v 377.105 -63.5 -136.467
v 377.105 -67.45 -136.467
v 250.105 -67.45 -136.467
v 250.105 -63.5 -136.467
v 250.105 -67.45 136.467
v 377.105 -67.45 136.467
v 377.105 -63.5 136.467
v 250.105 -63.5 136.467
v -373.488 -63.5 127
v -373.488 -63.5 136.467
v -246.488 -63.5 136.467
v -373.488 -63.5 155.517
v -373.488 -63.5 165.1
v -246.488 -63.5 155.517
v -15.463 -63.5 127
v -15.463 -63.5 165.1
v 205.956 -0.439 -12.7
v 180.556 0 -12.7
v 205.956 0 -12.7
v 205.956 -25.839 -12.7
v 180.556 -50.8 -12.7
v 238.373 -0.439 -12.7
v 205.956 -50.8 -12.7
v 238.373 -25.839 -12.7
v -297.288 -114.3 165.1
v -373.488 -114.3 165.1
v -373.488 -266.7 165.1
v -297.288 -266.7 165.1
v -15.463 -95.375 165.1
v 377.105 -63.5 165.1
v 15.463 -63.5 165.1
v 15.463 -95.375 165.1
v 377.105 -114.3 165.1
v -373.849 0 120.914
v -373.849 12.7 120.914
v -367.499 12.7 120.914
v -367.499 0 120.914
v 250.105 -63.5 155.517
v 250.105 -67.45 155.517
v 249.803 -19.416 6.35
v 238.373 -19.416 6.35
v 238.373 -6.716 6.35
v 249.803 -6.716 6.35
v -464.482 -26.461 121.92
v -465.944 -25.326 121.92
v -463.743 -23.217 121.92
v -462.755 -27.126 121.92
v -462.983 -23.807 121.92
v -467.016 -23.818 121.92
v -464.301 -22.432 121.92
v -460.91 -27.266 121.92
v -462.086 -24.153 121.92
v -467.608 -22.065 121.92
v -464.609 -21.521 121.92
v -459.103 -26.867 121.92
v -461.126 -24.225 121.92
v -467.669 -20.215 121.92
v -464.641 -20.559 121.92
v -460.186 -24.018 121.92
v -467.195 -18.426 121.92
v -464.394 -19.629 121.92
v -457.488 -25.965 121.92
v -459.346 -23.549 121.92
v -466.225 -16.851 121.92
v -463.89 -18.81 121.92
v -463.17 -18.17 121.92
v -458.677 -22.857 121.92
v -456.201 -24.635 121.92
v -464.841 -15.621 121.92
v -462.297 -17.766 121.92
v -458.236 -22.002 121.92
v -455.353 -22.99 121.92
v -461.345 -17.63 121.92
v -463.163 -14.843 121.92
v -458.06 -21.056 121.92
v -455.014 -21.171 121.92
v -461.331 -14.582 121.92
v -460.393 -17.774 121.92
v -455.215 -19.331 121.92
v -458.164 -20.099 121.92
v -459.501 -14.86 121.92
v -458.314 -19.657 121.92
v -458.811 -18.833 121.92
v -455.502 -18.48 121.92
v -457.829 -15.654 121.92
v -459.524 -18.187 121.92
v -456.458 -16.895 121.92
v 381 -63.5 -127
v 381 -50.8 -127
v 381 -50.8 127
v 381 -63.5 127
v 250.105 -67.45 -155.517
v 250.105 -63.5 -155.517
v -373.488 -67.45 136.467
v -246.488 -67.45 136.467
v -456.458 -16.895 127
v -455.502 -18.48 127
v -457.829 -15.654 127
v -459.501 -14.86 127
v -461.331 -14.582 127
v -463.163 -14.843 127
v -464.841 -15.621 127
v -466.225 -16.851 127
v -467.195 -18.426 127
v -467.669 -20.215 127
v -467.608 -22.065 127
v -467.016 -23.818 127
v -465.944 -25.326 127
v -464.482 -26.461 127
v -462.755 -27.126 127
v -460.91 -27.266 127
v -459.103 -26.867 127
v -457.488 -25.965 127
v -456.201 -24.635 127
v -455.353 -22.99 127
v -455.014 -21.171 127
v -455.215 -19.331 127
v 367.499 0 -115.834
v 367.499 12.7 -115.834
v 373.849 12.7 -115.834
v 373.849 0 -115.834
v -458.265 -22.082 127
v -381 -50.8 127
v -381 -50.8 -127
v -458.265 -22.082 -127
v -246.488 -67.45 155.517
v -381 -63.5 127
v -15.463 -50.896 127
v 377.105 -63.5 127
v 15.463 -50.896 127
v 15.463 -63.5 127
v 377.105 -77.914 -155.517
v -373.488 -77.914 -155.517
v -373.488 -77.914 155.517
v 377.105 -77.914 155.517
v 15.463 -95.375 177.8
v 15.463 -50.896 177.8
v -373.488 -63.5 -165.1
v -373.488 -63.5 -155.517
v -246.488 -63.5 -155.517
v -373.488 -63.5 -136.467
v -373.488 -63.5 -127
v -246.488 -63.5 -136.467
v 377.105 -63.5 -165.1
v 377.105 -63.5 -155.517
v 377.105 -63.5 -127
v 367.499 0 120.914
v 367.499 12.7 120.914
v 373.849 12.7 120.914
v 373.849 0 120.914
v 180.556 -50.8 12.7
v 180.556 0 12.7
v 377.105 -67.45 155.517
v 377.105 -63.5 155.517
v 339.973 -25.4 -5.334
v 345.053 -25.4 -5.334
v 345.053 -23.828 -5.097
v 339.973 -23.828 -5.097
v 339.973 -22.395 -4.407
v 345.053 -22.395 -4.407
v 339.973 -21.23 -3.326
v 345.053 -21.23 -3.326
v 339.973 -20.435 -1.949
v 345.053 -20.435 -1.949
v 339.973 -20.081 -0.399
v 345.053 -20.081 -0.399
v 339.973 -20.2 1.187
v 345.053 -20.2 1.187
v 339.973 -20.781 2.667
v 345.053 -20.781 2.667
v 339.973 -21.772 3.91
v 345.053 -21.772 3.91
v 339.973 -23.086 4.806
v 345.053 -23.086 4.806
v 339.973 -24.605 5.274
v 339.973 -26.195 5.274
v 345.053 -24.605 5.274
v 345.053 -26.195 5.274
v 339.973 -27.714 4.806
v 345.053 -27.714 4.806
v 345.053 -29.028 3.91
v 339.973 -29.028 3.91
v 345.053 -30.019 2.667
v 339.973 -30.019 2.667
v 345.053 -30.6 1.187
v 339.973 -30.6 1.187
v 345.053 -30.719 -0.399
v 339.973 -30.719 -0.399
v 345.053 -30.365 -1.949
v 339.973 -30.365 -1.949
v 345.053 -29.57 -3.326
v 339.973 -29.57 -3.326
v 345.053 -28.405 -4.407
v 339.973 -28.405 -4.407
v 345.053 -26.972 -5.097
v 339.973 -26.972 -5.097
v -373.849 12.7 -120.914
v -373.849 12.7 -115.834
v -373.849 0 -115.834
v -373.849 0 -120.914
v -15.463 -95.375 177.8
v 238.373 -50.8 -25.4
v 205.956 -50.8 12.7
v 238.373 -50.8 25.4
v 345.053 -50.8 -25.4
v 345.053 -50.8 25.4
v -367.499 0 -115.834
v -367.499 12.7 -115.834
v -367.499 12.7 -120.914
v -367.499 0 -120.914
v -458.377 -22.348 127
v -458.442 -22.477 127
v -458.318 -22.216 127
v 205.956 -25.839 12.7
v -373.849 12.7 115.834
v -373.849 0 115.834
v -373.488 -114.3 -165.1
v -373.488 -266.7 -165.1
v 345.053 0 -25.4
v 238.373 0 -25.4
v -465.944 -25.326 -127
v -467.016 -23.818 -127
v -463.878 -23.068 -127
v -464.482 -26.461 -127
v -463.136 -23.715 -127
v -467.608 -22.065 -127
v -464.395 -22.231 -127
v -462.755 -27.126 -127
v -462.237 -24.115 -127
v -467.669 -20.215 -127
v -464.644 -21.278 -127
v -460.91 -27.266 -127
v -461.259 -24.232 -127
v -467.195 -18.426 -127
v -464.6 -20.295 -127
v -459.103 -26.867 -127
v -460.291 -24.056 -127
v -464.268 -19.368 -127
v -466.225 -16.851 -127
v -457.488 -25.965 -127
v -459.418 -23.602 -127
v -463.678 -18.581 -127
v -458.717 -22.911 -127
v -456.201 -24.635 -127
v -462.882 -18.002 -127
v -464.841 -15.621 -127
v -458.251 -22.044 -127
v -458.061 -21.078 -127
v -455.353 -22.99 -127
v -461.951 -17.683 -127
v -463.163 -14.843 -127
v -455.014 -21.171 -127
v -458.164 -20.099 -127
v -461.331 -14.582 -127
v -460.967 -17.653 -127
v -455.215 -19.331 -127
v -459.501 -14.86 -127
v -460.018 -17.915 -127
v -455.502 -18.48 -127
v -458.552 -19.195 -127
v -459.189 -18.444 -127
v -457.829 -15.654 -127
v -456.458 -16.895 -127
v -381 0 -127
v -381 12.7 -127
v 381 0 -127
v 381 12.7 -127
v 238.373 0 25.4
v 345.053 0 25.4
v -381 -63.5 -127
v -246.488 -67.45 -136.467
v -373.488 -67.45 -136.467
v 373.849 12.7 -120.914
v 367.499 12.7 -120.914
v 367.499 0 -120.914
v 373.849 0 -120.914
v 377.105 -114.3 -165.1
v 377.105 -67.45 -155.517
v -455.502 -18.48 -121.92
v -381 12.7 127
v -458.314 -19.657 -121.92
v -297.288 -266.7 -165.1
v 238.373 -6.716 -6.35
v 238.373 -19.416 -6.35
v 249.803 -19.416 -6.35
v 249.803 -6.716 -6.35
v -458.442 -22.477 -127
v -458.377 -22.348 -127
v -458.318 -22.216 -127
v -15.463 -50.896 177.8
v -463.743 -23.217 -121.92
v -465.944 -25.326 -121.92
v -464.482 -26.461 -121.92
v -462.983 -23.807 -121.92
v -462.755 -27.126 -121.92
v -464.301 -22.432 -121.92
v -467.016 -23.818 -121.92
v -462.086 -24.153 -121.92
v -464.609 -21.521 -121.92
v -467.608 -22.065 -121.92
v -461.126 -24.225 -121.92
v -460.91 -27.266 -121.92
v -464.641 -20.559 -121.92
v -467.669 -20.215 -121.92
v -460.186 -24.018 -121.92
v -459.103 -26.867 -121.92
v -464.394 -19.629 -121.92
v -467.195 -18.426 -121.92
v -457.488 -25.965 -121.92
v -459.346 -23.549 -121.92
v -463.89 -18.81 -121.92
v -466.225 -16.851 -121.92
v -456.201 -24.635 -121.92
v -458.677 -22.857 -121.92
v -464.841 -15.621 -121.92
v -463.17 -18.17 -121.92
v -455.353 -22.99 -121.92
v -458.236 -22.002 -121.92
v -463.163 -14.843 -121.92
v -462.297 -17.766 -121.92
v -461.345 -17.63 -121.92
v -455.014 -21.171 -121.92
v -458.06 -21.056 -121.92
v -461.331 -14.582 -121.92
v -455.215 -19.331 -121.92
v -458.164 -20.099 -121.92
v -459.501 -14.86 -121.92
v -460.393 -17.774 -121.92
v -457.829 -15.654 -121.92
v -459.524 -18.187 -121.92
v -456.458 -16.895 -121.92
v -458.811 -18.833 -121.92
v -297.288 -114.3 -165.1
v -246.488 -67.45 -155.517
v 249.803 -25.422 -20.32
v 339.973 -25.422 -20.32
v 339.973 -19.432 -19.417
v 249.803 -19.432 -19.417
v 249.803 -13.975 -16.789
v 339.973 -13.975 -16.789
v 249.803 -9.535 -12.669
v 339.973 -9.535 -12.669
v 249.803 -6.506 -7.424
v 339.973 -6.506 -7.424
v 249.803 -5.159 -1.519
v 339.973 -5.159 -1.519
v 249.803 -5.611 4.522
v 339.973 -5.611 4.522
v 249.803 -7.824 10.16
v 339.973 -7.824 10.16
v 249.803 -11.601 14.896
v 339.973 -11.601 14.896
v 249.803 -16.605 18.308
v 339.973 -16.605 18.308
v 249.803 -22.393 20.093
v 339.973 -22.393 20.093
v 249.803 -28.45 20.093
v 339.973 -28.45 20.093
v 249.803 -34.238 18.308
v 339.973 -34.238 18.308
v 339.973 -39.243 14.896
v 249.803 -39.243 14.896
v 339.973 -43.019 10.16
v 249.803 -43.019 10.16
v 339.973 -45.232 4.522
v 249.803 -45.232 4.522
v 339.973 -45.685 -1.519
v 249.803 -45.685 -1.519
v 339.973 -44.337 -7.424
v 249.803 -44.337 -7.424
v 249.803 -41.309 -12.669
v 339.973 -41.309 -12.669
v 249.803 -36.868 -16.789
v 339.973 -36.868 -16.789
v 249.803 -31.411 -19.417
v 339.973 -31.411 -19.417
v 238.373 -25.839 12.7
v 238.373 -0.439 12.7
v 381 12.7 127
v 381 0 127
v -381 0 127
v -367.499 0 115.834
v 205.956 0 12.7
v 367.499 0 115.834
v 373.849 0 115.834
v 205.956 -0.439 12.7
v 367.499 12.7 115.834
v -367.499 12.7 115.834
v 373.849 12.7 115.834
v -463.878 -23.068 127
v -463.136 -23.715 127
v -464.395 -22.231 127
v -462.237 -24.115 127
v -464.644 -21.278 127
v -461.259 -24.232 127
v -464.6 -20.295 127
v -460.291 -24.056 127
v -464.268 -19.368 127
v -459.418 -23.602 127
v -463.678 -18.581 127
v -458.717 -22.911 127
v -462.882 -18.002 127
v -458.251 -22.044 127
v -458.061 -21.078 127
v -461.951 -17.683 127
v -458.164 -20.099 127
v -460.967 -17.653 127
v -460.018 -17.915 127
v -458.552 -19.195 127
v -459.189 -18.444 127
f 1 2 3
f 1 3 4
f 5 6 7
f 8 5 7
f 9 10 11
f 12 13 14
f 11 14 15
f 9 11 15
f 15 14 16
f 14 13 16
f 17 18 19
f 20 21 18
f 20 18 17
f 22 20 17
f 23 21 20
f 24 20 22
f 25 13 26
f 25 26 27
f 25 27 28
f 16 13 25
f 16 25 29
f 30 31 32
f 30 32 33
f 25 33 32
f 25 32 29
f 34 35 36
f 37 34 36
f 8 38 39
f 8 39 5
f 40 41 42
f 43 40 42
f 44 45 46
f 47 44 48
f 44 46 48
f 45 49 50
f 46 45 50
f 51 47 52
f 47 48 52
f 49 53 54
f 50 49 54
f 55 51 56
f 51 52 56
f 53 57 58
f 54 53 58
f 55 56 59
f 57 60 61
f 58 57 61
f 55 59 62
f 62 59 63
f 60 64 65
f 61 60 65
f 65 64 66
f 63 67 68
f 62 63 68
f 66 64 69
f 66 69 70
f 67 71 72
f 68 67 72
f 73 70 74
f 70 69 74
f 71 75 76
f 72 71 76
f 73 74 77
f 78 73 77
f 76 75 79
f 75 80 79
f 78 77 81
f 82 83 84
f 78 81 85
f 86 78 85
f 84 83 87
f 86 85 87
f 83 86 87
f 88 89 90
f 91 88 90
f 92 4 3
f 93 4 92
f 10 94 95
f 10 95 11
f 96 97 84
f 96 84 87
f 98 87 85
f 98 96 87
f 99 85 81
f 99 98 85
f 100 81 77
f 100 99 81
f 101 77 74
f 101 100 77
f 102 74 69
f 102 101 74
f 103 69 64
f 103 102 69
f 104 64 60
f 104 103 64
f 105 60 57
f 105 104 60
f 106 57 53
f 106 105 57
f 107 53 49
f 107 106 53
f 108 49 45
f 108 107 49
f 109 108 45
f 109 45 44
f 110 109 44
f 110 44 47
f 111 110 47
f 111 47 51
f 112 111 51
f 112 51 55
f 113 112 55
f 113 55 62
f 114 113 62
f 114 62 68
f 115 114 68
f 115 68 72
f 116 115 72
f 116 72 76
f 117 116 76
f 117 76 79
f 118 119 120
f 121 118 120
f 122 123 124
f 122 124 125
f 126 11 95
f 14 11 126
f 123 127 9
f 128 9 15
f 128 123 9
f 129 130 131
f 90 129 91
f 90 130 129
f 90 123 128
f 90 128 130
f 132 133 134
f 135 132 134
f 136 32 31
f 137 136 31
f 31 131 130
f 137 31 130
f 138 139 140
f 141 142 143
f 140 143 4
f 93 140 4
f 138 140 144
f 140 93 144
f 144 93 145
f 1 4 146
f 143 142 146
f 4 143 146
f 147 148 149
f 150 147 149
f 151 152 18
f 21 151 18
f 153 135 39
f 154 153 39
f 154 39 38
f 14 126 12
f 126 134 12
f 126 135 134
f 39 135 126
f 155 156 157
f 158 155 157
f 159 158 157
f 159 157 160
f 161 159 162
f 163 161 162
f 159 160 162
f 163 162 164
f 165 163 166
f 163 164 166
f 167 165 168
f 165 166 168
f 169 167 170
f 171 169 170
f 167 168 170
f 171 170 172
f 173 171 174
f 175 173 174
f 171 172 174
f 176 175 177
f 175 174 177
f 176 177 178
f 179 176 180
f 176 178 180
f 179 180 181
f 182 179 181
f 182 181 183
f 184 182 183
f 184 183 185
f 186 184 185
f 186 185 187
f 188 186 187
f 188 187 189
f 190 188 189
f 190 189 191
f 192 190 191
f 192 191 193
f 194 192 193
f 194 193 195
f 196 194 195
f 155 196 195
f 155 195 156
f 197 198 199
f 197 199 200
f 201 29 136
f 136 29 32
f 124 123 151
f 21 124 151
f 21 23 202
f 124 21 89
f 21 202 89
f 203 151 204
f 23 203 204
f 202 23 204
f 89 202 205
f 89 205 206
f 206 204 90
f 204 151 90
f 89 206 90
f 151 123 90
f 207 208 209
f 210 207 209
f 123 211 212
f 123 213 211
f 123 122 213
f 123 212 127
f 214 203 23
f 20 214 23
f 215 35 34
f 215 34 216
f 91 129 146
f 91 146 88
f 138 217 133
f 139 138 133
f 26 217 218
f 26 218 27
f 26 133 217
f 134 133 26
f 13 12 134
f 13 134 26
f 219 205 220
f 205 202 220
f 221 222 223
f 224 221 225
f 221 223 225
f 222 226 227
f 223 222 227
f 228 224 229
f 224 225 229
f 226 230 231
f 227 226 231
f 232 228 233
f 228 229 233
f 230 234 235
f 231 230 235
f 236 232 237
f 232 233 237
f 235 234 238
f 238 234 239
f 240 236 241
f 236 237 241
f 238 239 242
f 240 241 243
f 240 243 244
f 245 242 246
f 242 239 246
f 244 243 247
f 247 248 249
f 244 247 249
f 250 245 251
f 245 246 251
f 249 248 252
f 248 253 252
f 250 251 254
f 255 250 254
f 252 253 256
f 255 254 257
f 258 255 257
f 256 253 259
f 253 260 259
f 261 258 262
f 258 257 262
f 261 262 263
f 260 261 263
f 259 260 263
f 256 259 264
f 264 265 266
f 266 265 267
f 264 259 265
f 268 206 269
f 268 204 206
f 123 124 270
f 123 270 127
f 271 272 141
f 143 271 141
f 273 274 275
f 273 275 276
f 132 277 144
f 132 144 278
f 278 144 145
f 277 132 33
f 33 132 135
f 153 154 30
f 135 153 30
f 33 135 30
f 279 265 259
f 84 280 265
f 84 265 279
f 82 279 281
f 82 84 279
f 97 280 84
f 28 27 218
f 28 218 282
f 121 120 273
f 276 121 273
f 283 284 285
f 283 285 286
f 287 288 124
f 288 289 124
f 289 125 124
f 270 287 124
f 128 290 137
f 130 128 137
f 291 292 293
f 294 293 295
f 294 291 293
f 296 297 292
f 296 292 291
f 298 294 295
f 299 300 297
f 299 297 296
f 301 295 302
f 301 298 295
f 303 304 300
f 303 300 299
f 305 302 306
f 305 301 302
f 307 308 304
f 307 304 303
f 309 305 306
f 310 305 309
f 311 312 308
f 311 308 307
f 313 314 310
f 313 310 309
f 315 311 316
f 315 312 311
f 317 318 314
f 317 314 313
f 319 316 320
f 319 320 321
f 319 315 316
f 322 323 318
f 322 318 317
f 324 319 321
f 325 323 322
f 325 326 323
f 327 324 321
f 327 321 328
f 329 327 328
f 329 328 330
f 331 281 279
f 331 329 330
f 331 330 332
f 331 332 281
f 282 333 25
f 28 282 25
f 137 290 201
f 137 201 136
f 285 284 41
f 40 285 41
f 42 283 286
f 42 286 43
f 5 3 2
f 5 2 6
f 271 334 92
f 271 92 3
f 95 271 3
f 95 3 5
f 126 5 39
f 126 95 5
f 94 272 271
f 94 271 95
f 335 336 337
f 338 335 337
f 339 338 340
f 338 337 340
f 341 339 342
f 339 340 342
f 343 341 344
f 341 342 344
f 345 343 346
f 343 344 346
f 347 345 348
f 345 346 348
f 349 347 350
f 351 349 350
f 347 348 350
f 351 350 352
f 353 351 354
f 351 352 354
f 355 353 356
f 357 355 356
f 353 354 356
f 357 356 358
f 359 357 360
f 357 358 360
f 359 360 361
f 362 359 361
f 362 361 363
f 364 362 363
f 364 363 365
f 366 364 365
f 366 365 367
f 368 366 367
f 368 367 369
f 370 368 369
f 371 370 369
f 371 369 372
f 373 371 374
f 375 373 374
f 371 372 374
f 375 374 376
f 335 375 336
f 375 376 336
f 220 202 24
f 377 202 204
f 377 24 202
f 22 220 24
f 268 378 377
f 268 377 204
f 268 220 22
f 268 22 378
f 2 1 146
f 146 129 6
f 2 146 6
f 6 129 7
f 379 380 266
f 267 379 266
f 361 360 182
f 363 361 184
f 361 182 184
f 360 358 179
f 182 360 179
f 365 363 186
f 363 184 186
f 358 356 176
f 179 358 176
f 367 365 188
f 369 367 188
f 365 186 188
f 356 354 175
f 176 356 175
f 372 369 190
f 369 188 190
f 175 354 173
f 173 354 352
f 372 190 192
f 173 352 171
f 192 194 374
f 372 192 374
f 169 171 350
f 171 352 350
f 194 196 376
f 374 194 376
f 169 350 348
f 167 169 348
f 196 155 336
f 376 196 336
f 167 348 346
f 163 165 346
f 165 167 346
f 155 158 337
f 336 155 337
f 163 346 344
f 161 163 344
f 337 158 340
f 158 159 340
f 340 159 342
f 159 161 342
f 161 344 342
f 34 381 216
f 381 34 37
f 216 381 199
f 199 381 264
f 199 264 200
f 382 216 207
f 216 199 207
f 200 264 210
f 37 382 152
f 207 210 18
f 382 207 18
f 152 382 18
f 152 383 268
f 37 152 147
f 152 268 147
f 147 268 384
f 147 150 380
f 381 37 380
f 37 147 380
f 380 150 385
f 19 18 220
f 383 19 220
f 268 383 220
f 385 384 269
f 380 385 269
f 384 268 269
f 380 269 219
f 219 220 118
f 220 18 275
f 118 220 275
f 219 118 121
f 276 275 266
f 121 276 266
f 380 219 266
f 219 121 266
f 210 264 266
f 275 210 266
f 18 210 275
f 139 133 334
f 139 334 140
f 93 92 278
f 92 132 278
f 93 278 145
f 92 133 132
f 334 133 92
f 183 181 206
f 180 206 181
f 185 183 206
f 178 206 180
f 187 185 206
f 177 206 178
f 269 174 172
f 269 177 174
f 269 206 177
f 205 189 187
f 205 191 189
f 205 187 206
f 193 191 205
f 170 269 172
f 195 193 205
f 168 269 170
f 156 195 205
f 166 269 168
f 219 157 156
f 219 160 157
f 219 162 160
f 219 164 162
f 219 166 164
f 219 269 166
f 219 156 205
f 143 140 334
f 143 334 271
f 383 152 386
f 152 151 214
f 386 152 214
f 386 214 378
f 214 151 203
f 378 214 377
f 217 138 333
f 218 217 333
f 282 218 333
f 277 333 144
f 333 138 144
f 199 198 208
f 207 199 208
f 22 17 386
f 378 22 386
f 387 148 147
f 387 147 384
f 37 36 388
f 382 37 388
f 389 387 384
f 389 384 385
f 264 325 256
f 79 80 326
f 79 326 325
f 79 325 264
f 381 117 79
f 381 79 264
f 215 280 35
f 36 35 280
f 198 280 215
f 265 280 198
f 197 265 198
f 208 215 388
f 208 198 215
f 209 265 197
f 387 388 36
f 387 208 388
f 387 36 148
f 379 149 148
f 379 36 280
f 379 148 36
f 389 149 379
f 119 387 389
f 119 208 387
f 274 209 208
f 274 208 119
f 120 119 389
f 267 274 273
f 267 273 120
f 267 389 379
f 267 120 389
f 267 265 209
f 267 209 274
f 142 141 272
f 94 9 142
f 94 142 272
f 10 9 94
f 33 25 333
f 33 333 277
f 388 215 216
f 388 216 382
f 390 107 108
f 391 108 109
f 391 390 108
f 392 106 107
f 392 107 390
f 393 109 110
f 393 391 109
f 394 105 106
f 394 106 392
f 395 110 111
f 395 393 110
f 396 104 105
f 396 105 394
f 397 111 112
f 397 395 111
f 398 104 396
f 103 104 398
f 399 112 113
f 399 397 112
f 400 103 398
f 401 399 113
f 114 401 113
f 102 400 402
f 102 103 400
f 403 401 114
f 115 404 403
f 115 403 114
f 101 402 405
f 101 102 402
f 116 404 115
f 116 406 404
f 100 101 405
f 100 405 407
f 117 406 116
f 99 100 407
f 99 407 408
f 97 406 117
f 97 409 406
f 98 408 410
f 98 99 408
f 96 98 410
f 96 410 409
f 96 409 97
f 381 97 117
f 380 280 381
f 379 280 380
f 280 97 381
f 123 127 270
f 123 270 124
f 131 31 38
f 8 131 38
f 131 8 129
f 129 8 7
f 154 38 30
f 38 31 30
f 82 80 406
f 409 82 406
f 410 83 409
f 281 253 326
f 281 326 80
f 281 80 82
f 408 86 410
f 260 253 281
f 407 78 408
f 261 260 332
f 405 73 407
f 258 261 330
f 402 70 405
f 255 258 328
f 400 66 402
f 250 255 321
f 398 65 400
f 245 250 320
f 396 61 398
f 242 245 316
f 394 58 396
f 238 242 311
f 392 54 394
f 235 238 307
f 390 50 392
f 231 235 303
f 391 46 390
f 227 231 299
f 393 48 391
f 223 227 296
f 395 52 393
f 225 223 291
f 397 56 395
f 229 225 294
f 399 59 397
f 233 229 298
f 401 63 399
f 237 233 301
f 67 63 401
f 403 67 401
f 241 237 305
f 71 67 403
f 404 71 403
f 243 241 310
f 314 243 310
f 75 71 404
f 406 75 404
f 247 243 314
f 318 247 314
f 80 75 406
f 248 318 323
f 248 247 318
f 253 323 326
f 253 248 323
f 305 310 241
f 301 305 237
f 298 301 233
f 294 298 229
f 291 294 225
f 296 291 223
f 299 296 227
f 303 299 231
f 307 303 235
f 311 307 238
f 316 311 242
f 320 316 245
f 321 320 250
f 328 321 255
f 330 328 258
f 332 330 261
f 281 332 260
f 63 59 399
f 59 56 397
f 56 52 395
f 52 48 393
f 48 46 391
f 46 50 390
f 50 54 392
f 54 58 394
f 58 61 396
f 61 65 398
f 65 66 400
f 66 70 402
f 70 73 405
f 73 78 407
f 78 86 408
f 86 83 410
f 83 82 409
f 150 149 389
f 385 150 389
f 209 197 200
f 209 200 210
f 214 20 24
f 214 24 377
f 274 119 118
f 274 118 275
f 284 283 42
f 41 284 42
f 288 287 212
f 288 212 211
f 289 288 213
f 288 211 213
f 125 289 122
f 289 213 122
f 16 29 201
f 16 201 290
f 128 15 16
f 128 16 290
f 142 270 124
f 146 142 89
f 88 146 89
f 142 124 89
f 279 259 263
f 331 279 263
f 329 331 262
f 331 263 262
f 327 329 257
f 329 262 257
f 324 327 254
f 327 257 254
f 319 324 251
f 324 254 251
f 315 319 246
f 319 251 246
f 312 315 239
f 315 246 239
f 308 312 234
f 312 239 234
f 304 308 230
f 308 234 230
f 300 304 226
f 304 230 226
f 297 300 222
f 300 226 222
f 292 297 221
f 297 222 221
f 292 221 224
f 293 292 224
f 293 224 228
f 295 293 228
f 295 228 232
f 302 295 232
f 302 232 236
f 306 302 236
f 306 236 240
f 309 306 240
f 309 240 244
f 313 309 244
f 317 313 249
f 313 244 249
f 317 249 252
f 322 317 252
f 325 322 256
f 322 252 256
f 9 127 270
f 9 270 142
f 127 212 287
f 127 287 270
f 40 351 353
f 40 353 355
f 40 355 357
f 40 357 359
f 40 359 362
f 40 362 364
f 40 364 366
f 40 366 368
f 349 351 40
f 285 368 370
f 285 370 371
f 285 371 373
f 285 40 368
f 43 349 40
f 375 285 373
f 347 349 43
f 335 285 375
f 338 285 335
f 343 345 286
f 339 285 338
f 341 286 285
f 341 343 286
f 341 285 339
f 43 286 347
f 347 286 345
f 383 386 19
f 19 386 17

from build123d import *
from build123d.topology import SkipClean

# Parameters (mm, degrees)
SKETCH1_W            = 762
SKETCH1_H            = 254
BOSS_EXTRUDE1_DEPTH  = 12.7
BOSS_EXTRUDE2_DEPTH  = 254
SKETCH9_W            = 6.35
SKETCH9_H            = 5.08
CUT_EXTRUDE1_DEPTH   = 480.700909137
SKETCH5_R            = 6.35
SKETCH5_R_2          = 3.302
BOSS_EXTRUDE8_DEPTH  = 5.08
SKETCH13_W           = 101.6
SKETCH13_H           = 50.8
BOSS_EXTRUDE10_DEPTH = 50.8
SKETCH15_R           = 20.32
CUT_EXTRUDE3_DEPTH   = 90.17
SKETCH16_W           = 50.8
SKETCH16_H           = 50.8
BOSS_EXTRUDE11_DEPTH = 5.08
CUT_EXTRUDE4_REACH   = 826.192
SKETCH17_R           = 5.334
CUT_EXTRUDE6_REACH   = 721.209
SKETCH19_W           = 12.7
SKETCH19_H           = 12.7
SKETCH20_W           = 762
SKETCH20_H           = 254
BOSS_EXTRUDE12_DEPTH = 12.7
BOSS_EXTRUDE15_DEPTH = 254
SKETCH23_R           = 3.302
CUT_EXTRUDE7_DEPTH   = 537.004396119
SKETCH24_W           = 750.592755811
SKETCH24_H           = 330.2
BOSS_EXTRUDE16_DEPTH = 50.8
SKETCH28_W           = 76.2
SKETCH28_H           = 330.2
BOSS_EXTRUDE17_DEPTH = 152.4
BOSS_EXTRUDE9_START  = -5.08
SKETCH12_R           = 6.35
SKETCH12_R_2         = 3.302
BOSS_EXTRUDE9_DEPTH  = 5.08
SKETCH29_W           = 25.4
SKETCH29_H           = 25.4
BOSS_EXTRUDE18_DEPTH = 50.8
SKETCH30_W           = 25.4
SKETCH30_H           = 25.4
BOSS_EXTRUDE19_DEPTH = 50.8
SKETCH31_W           = 30.926953994
SKETCH31_H           = 44.4789806
BOSS_EXTRUDE20_DEPTH = 50.8
SKETCH25_W           = 311.03418717
SKETCH25_H           = 10.464606508
CUT_EXTRUDE8_DEPTH   = 820.751966299
SKETCH32_W           = 19.05
SKETCH32_H           = 14.241541755
CUT_EXTRUDE9_DEPTH   = 127
SKETCH33_W           = 19.05
SKETCH33_H           = 23.618402859
SKETCH33_H_2         = 14.241541755
CUT_EXTRUDE10_DEPTH  = 127


with BuildPart() as part:
    # Sketch1 → Boss-Extrude1 (new body)
    with BuildSketch(Plane(origin=(0, 0, 0), x_dir=(1, 0, 0), z_dir=(0, 1, 0))):
        Rectangle(SKETCH1_W, SKETCH1_H)
    extrude(amount=BOSS_EXTRUDE1_DEPTH)

    # Sketch2 → Boss-Extrude2 (add)
    with BuildSketch(Plane.XY.offset(127)):
        Polygon((-381, 12.7), (-461.359806033, -20.931705337), (-381, 0), align=None)
    extrude(amount=-BOSS_EXTRUDE2_DEPTH)

    # Sketch9 → Cut-Extrude1 (cut, through all)
    with BuildSketch(Plane(origin=(0, 12.7, 0), x_dir=(1, 0, 0), z_dir=(0, 1, 0))):
        with Locations((370.67362949, -118.374235509)):
            Rectangle(SKETCH9_W, SKETCH9_H)
        with Locations((370.67362949, 118.374235509)):
            Rectangle(SKETCH9_W, SKETCH9_H)
        with Locations((-370.67362949, 118.374235509)):
            Rectangle(SKETCH9_W, SKETCH9_H)
        with Locations((-370.67362949, -118.374235509)):
            Rectangle(SKETCH9_W, SKETCH9_H)
    extrude(amount=-CUT_EXTRUDE1_DEPTH, mode=Mode.SUBTRACT)

    # Sketch5 → Boss-Extrude8 (add)
    with BuildSketch(Plane.XY.offset(127)):
        with Locations((-461.359806033, -20.931705337)):
            Circle(SKETCH5_R)
        with Locations((-461.359806033, -20.931705337)):
            Circle(SKETCH5_R_2, mode=Mode.SUBTRACT)
    boss_extrude8 = extrude(amount=-BOSS_EXTRUDE8_DEPTH)

    # Sketch13 → Boss-Extrude10 (add)
    with BuildSketch(Plane.XZ):
        with Locations((289.172611065, 0)):
            Rectangle(SKETCH13_W, SKETCH13_H)
    extrude(amount=BOSS_EXTRUDE10_DEPTH)

    # Sketch15 → Cut-Extrude3 (cut)
    with BuildSketch(Plane(origin=(339.972611065, 0, 0), x_dir=(0, 0, -1), z_dir=(1, 0, 0))):
        with Locations((0, -25.42171176)):
            Circle(SKETCH15_R)
    extrude(amount=-CUT_EXTRUDE3_DEPTH, mode=Mode.SUBTRACT)

    # Sketch16 → Boss-Extrude11 (add)
    with BuildSketch(Plane(origin=(339.972611065, 0, 0), x_dir=(0, 0, -1), z_dir=(1, 0, 0))):
        with Locations((0, -25.4)):
            Rectangle(SKETCH16_W, SKETCH16_H)
    extrude(amount=BOSS_EXTRUDE11_DEPTH)

    # Sketch17 → Cut-Extrude4 (cut, up to next)
    with BuildSketch(Plane(origin=(345.052611065, 0, 0), x_dir=(0, 0, -1), z_dir=(1, 0, 0)), mode=Mode.PRIVATE) as cut_extrude4_sk1:
        with Locations((0, -25.4)):
            Circle(SKETCH17_R)
    cut_extrude4_tool1 = extrude(cut_extrude4_sk1.sketch, amount=-CUT_EXTRUDE4_REACH, mode=Mode.PRIVATE) & part.part
    add(cut_extrude4_tool1.solids().sort_by_distance((345.052611, -25.4, 0))[0], mode=Mode.SUBTRACT)

    # Sketch19 → Cut-Extrude6 (cut, up to next)
    with BuildSketch(Plane.ZY.offset(-238.372611065), mode=Mode.PRIVATE) as cut_extrude6_sk1:
        with Locations((0, -13.066258938)):
            Rectangle(SKETCH19_W, SKETCH19_H)
    cut_extrude6_tool1 = extrude(cut_extrude6_sk1.sketch, amount=-CUT_EXTRUDE6_REACH, mode=Mode.PRIVATE) & part.part
    add(cut_extrude6_tool1.solids().sort_by_distance((238.372611, -13.066259, 0))[0], mode=Mode.SUBTRACT)

    # Sketch20 → Boss-Extrude12 (add)
    with BuildSketch(Plane.XZ.offset(50.8)):
        Rectangle(SKETCH20_W, SKETCH20_H)
    extrude(amount=BOSS_EXTRUDE12_DEPTH)

    # Mirror1: Boss-Extrude8 across plane
    add(boss_extrude8.mirror(Plane.XY))


with BuildPart() as body_2:
    # Sketch22 → Boss-Extrude15 (new body)
    with BuildSketch(Plane.XY.offset(127)):
        Polygon((-381, -50.8), (-461.359806033, -20.931705337), (-381, -63.5), align=None)
    extrude(amount=-BOSS_EXTRUDE15_DEPTH)


with BuildPart() as cut_extrude7_tool:
    # Sketch23 → Cut-Extrude7 (new, through all)
    with SkipClean():  # the faces are left unmerged after this step: merging them gives an invalid solid
        with BuildSketch(Plane.XY.offset(127)):
            with Locations((-461.359806033, -20.931705337)):
                Circle(SKETCH23_R)
        extrude(amount=-CUT_EXTRUDE7_DEPTH)


with BuildPart() as part_1:
    with SkipClean():  # the faces are left unmerged after this step: merging them gives an invalid solid
        add(part.part)

        # Cut-Extrude7: cut by cut_extrude7_tool
        add(cut_extrude7_tool.part, mode=Mode.SUBTRACT)

    # Sketch24 → Boss-Extrude16 (add)
    with SkipClean():  # the faces are left unmerged after this step: merging them gives an invalid solid
        with BuildSketch(Plane.XZ.offset(63.5)):
            with Locations((1.808766177, 0)):
                Rectangle(SKETCH24_W, SKETCH24_H)
        extrude(amount=BOSS_EXTRUDE16_DEPTH)

    # Sketch28 → Boss-Extrude17 (add)
    with SkipClean():  # the faces are left unmerged after this step: merging them gives an invalid solid
        with BuildSketch(Plane.XZ.offset(114.3)):
            with Locations((-335.387611728, 0)):
                Rectangle(SKETCH28_W, SKETCH28_H)
        extrude(amount=BOSS_EXTRUDE17_DEPTH)

    # Sketch12 → Boss-Extrude9 (add)
    with BuildSketch(Plane(origin=(0, 0, -127), x_dir=(-1, 0, 0), z_dir=(0, 0, -1)).offset(BOSS_EXTRUDE9_START)):
        with Locations((461.359806033, -20.931705337)):
            Circle(SKETCH12_R)
        with Locations(Location((461.359806033, -20.931705337, 0), (0, 0, 180))):
            Circle(SKETCH12_R_2, mode=Mode.SUBTRACT)
    extrude(amount=BOSS_EXTRUDE9_DEPTH)

    # Sketch29 → Boss-Extrude18 (add)
    with BuildSketch(Plane.ZY.offset(-238.372611065)):
        with Locations((0, -13.138927811)):
            Rectangle(SKETCH29_W, SKETCH29_H)
    extrude(amount=BOSS_EXTRUDE18_DEPTH)

    # Sketch30 → Boss-Extrude19 (add)
    with BuildSketch(Plane(origin=(0, -50.8, 0), x_dir=(1, 0, 0), z_dir=(0, 1, 0))):
        with Locations((193.255755509, 0)):
            Rectangle(SKETCH30_W, SKETCH30_H)
    extrude(amount=BOSS_EXTRUDE19_DEPTH)

    # Sketch31 → Boss-Extrude20 (add)
    with BuildSketch(Plane.XY.offset(127)):
        with Locations((0, -73.135256809)):
            Rectangle(SKETCH31_W, SKETCH31_H)
    extrude(amount=BOSS_EXTRUDE20_DEPTH)

    # Sketch25 → Cut-Extrude8 (cut, through all)
    with BuildSketch(Plane.ZY.offset(373.487611728)):
        with Locations((0, -72.682025016)):
            Rectangle(SKETCH25_W, SKETCH25_H)
    extrude(amount=-CUT_EXTRUDE8_DEPTH, mode=Mode.SUBTRACT)

    # Sketch32 → Cut-Extrude9 (cut)
    with BuildSketch(Plane.ZY.offset(373.487611728)):
        with Locations((145.992093585, -60.328950885)):
            Rectangle(SKETCH32_W, SKETCH32_H)
        with Locations((-145.992093585, -60.328950885)):
            Rectangle(SKETCH32_W, SKETCH32_H)
    extrude(amount=-CUT_EXTRUDE9_DEPTH, mode=Mode.SUBTRACT)

    # Sketch33 → Cut-Extrude10 (cut)
    with BuildSketch(Plane(origin=(377.105144083, 0, 0), x_dir=(0, 0, -1), z_dir=(1, 0, 0))):
        with Locations((-145.992093585, -55.640520333)):
            Rectangle(SKETCH33_W, SKETCH33_H)
        with Locations((145.992093585, -60.328950885)):
            Rectangle(SKETCH33_W, SKETCH33_H_2)
    extrude(amount=-CUT_EXTRUDE10_DEPTH, mode=Mode.SUBTRACT)


with BuildPart() as body_2_1:
    with SkipClean():  # the faces are left unmerged after this step: merging them gives an invalid solid
        add(body_2.part)

        # Cut-Extrude7: cut by cut_extrude7_tool
        add(cut_extrude7_tool.part, mode=Mode.SUBTRACT)


solid = Compound([part_1.part, body_2_1.part])
